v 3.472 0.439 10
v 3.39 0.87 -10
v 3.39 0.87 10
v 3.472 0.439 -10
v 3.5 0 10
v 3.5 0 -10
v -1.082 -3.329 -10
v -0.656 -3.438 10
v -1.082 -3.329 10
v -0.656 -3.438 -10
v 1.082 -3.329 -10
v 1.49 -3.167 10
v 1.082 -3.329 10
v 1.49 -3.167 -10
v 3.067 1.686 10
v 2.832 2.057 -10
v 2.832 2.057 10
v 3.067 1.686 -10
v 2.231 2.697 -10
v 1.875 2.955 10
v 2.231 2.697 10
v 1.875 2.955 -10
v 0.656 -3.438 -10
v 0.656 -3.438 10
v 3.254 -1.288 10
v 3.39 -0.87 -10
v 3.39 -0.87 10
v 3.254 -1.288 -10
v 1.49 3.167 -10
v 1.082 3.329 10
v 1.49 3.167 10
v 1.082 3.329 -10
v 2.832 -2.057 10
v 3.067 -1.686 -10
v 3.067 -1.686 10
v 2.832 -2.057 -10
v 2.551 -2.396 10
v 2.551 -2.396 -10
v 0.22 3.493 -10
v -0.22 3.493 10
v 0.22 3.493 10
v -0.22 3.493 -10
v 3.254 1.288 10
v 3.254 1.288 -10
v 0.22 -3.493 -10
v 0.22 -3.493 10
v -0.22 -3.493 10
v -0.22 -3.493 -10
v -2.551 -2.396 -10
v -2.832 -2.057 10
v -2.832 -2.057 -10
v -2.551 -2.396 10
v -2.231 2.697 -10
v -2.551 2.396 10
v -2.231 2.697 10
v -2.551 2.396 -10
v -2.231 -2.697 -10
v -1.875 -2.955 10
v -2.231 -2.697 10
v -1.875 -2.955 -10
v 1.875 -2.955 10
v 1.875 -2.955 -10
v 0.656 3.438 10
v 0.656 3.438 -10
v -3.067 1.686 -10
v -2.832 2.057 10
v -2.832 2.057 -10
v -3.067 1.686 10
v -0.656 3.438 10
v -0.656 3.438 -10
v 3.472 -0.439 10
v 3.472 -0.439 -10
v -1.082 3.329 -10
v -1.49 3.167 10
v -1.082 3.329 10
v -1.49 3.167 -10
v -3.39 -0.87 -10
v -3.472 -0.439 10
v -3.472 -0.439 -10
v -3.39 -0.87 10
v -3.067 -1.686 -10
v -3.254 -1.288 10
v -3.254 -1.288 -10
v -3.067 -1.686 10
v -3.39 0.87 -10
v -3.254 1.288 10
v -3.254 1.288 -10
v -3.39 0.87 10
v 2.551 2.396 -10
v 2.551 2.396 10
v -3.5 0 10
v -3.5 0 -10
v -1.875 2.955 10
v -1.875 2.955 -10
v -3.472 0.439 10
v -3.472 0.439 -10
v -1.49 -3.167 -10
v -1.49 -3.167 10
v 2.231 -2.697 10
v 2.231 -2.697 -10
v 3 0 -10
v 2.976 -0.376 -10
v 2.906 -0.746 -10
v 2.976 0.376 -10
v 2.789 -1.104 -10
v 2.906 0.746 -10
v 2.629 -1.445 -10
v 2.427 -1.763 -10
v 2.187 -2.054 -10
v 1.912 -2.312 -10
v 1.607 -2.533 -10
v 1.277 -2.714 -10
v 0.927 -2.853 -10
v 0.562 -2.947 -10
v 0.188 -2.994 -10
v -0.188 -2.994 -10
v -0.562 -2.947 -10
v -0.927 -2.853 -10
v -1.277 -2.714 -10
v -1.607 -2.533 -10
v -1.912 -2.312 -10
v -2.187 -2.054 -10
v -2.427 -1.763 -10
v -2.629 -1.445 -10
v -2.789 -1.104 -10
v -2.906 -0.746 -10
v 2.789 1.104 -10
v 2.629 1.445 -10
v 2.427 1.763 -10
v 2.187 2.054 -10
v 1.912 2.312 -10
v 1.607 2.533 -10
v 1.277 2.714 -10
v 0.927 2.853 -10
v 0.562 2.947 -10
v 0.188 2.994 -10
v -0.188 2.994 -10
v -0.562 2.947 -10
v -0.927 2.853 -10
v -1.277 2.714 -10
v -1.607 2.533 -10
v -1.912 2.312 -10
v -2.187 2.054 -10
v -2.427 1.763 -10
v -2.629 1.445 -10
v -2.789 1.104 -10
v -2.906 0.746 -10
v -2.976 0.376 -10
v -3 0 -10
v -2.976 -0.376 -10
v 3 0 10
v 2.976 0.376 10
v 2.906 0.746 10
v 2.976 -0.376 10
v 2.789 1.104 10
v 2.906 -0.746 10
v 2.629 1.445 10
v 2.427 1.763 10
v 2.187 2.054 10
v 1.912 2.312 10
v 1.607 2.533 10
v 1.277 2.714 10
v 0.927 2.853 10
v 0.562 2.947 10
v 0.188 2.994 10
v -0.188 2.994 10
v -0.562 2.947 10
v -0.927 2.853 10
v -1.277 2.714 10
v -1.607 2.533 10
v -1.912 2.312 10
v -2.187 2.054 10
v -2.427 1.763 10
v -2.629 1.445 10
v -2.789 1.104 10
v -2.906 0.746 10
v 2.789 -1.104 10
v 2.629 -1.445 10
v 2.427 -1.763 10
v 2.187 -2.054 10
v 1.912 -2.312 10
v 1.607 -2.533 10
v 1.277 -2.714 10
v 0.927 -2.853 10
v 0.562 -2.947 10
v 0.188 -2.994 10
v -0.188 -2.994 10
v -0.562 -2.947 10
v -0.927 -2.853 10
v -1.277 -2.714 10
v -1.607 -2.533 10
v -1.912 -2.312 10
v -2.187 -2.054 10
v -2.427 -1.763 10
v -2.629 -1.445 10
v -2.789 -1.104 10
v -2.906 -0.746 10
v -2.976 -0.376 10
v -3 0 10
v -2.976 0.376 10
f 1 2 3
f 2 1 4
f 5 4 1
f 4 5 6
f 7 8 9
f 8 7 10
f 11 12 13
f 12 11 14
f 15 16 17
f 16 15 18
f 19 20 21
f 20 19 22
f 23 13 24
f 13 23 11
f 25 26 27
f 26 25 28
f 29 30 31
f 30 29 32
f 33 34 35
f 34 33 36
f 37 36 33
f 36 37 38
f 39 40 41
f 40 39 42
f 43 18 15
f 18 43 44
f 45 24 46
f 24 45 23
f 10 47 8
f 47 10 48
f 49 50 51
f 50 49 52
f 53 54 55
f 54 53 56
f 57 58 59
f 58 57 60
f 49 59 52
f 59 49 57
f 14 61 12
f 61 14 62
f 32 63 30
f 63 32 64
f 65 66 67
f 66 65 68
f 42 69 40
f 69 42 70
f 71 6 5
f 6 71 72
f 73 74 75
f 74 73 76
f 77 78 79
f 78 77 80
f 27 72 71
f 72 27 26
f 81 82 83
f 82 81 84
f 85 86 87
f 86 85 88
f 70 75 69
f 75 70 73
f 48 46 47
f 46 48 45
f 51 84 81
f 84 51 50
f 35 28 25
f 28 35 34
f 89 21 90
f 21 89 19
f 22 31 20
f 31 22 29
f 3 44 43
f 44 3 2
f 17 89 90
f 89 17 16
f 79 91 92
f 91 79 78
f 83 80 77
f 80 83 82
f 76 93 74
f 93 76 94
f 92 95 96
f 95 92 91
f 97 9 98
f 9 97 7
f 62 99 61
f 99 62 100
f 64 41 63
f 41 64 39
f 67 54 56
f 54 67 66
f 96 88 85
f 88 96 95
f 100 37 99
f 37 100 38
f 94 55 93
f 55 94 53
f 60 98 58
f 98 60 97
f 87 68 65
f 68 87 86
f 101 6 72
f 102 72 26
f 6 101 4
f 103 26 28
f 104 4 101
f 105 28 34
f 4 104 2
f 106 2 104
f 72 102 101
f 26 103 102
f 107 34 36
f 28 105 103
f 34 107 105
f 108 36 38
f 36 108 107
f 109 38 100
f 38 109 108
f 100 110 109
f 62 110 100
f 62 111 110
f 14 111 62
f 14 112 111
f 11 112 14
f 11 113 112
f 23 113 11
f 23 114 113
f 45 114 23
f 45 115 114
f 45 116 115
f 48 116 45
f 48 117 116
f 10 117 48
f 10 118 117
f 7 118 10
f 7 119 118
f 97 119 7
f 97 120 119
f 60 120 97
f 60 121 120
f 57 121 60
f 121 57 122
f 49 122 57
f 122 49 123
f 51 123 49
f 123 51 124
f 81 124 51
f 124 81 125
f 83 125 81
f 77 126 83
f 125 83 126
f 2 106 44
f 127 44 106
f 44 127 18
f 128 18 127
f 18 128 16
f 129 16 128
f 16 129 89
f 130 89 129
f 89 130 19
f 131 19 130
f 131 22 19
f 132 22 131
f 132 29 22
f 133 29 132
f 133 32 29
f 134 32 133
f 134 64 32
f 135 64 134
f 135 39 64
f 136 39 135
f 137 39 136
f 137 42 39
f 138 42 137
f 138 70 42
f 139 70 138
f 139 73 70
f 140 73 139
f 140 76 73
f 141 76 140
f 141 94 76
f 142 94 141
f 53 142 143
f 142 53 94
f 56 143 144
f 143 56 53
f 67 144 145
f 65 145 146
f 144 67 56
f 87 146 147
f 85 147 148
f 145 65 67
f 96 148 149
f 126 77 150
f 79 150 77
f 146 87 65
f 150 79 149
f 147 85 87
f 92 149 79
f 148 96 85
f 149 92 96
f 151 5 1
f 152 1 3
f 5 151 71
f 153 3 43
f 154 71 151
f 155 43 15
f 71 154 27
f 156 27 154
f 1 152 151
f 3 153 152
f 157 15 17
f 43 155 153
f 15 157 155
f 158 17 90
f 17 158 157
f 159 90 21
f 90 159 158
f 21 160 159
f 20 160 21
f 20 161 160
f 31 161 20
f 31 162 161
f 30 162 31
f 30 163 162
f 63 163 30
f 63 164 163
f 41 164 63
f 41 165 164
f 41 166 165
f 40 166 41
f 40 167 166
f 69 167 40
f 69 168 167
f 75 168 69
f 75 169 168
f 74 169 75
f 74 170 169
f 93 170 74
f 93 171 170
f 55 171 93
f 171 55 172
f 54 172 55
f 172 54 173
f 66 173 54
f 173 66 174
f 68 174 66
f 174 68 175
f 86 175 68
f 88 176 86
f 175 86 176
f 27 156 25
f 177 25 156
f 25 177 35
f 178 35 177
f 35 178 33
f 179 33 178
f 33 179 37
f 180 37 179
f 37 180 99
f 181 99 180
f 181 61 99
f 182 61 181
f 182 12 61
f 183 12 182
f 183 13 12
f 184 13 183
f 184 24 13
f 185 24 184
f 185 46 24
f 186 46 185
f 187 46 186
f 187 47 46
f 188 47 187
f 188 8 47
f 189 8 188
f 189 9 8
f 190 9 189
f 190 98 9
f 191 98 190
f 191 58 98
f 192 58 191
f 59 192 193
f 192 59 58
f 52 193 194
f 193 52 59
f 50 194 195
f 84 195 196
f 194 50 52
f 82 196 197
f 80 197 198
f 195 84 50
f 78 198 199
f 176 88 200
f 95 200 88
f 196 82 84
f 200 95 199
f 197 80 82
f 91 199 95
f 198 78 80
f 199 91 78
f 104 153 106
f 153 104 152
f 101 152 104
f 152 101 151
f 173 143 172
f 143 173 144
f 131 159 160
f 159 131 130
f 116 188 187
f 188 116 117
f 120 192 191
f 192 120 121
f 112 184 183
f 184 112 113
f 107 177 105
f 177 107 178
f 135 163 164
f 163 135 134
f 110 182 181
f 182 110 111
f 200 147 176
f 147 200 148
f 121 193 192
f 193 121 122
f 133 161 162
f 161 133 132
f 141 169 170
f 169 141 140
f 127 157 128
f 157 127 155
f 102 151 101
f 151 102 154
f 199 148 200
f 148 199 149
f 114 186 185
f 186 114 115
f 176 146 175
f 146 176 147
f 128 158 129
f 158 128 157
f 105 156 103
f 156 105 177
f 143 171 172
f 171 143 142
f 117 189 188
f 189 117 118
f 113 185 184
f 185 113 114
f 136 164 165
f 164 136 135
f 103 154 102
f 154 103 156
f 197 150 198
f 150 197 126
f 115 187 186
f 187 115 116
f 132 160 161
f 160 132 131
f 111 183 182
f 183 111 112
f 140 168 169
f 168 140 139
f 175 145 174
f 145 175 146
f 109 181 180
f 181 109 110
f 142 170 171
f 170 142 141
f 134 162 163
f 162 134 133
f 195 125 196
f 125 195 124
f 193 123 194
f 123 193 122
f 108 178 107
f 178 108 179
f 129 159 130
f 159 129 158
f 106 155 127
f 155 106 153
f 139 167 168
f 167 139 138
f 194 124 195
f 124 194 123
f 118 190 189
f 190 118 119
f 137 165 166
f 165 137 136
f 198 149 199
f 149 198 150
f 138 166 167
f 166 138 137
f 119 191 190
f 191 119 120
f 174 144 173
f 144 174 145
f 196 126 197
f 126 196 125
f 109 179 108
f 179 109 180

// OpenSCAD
$fn = 50;


difference() {
	union() {
		translate(v = [0, 0, -10.0000000000]) {
			cylinder(h = 20, r = 3.5000000000);
		}
	}
	union() {
		translate(v = [0, 0, -100.0000000000]) {
			cylinder(h = 200, r = 3.0000000000);
		}
	}
}
